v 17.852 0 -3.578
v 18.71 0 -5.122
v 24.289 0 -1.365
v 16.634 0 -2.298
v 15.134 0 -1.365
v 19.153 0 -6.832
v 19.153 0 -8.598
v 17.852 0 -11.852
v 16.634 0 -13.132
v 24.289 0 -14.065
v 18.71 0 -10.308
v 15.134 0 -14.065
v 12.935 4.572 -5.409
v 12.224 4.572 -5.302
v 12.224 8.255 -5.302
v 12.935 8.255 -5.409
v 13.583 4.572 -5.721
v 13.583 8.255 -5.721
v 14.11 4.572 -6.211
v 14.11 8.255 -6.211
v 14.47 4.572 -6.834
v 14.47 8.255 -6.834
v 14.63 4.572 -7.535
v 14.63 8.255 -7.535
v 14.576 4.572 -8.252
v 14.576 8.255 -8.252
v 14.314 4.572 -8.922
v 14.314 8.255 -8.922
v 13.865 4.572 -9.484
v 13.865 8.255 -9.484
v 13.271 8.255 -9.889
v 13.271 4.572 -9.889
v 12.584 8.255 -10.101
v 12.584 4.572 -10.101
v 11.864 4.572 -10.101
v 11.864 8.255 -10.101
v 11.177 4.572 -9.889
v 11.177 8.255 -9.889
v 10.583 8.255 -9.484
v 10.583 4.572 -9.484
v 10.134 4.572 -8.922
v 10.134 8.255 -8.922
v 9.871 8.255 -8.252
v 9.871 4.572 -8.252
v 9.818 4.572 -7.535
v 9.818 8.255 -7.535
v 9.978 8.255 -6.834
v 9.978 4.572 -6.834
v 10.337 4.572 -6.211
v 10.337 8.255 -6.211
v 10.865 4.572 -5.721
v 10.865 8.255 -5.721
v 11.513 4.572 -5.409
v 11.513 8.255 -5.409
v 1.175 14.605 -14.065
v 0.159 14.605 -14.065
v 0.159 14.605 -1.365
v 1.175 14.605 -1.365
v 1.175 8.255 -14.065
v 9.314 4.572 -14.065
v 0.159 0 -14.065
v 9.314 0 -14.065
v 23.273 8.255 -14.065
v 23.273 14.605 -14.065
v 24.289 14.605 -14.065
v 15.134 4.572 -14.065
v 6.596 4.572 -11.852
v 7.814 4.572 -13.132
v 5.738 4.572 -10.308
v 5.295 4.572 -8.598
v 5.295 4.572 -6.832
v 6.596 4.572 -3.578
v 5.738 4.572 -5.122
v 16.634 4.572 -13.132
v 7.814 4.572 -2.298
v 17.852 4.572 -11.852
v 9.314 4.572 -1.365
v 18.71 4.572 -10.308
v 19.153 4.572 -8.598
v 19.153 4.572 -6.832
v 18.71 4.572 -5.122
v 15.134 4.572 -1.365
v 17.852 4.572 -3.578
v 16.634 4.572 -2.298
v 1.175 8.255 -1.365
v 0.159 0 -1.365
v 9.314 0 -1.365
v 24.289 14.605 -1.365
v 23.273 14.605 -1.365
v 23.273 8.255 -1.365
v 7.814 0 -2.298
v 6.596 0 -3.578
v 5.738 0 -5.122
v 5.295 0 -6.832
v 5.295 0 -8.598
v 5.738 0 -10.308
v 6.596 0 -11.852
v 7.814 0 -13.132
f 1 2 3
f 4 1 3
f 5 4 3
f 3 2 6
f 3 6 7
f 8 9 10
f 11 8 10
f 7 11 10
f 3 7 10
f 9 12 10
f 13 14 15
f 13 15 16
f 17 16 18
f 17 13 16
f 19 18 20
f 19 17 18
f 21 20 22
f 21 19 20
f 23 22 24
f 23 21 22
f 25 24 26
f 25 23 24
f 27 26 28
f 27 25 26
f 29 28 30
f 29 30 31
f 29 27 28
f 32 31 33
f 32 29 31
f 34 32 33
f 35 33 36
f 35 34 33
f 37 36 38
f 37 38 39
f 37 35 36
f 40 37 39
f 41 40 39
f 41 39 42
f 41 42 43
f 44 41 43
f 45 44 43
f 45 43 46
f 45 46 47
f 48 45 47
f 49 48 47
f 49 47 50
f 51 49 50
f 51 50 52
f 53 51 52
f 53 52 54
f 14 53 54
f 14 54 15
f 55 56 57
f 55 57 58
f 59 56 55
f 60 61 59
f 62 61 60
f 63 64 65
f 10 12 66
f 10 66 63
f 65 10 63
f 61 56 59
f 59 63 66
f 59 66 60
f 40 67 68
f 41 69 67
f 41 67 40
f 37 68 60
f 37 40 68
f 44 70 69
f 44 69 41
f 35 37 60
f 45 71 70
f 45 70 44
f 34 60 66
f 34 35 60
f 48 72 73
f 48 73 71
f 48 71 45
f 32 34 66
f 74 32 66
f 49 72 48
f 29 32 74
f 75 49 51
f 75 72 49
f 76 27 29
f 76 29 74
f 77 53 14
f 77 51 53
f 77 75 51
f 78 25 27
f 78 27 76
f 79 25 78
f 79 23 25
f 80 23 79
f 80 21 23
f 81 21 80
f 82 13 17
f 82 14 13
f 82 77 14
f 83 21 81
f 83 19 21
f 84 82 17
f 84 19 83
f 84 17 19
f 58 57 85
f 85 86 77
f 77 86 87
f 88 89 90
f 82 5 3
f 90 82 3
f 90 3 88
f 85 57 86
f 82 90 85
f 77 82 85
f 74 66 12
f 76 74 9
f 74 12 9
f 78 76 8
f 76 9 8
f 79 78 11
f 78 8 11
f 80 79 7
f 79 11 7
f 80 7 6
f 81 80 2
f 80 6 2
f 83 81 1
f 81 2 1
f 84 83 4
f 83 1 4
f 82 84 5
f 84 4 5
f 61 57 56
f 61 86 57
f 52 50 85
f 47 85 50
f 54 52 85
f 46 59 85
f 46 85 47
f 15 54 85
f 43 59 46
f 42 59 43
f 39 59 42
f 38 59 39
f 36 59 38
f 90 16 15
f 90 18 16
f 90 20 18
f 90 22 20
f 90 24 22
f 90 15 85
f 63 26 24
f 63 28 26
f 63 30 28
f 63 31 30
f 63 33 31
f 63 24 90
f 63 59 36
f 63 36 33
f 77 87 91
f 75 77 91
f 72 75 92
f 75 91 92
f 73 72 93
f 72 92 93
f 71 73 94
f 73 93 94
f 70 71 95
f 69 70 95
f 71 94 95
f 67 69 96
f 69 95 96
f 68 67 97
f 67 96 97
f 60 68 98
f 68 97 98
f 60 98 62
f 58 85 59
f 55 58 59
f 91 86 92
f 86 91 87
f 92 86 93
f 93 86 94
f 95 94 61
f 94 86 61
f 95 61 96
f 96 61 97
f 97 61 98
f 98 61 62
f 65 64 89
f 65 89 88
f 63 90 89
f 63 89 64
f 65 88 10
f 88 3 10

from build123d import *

# Parameters (mm, degrees)
SKETCH2_W           = 24.13
SKETCH2_H           = 12.7
SKETCH2_R           = 2.413
BOSS_EXTRUDE1_DEPTH = 8.255
SKETCH3_W           = 1.016
SKETCH3_H           = 12.7
BOSS_EXTRUDE2_DEPTH = 6.35
SKETCH4_R           = 6.985
CUT_EXTRUDE1_DEPTH  = 4.572
SKETCH5_W           = 1.016
SKETCH5_H           = 12.7
BOSS_EXTRUDE3_DEPTH = 6.35


with BuildPart() as part:
    # Sketch2 → Boss-Extrude1 (new body)
    with BuildSketch(Plane(origin=(0, 0, 0), x_dir=(1, 0, 0), z_dir=(0, 1, 0))):
        with Locations((12.223927374, 7.715072626)):
            Rectangle(SKETCH2_W, SKETCH2_H)
        with Locations(Location((12.223927374, 7.715072626, 0), (0, 0, 270))):  # turned: the seam where the file's is
            Circle(SKETCH2_R, mode=Mode.SUBTRACT)
    extrude(amount=BOSS_EXTRUDE1_DEPTH)

    # Sketch3 → Boss-Extrude2 (add)
    with BuildSketch(Plane(origin=(0, 8.255, 0), x_dir=(1, 0, 0), z_dir=(0, 1, 0))):
        with Locations((0.666927374, 7.715072626)):
            Rectangle(SKETCH3_W, SKETCH3_H)
    extrude(amount=BOSS_EXTRUDE2_DEPTH)

    # Sketch4 → Cut-Extrude1 (cut)
    with BuildSketch(Plane.XZ):
        with Locations((12.223927374, -7.715072626)):
            Circle(SKETCH4_R)
    extrude(amount=-CUT_EXTRUDE1_DEPTH, mode=Mode.SUBTRACT)

    # Sketch5 → Boss-Extrude3 (add)
    with BuildSketch(Plane(origin=(0, 8.255, 0), x_dir=(1, 0, 0), z_dir=(0, 1, 0))):
        with Locations((23.780927374, 7.715072626)):
            Rectangle(SKETCH5_W, SKETCH5_H)
    extrude(amount=BOSS_EXTRUDE3_DEPTH)


solid = part.part
